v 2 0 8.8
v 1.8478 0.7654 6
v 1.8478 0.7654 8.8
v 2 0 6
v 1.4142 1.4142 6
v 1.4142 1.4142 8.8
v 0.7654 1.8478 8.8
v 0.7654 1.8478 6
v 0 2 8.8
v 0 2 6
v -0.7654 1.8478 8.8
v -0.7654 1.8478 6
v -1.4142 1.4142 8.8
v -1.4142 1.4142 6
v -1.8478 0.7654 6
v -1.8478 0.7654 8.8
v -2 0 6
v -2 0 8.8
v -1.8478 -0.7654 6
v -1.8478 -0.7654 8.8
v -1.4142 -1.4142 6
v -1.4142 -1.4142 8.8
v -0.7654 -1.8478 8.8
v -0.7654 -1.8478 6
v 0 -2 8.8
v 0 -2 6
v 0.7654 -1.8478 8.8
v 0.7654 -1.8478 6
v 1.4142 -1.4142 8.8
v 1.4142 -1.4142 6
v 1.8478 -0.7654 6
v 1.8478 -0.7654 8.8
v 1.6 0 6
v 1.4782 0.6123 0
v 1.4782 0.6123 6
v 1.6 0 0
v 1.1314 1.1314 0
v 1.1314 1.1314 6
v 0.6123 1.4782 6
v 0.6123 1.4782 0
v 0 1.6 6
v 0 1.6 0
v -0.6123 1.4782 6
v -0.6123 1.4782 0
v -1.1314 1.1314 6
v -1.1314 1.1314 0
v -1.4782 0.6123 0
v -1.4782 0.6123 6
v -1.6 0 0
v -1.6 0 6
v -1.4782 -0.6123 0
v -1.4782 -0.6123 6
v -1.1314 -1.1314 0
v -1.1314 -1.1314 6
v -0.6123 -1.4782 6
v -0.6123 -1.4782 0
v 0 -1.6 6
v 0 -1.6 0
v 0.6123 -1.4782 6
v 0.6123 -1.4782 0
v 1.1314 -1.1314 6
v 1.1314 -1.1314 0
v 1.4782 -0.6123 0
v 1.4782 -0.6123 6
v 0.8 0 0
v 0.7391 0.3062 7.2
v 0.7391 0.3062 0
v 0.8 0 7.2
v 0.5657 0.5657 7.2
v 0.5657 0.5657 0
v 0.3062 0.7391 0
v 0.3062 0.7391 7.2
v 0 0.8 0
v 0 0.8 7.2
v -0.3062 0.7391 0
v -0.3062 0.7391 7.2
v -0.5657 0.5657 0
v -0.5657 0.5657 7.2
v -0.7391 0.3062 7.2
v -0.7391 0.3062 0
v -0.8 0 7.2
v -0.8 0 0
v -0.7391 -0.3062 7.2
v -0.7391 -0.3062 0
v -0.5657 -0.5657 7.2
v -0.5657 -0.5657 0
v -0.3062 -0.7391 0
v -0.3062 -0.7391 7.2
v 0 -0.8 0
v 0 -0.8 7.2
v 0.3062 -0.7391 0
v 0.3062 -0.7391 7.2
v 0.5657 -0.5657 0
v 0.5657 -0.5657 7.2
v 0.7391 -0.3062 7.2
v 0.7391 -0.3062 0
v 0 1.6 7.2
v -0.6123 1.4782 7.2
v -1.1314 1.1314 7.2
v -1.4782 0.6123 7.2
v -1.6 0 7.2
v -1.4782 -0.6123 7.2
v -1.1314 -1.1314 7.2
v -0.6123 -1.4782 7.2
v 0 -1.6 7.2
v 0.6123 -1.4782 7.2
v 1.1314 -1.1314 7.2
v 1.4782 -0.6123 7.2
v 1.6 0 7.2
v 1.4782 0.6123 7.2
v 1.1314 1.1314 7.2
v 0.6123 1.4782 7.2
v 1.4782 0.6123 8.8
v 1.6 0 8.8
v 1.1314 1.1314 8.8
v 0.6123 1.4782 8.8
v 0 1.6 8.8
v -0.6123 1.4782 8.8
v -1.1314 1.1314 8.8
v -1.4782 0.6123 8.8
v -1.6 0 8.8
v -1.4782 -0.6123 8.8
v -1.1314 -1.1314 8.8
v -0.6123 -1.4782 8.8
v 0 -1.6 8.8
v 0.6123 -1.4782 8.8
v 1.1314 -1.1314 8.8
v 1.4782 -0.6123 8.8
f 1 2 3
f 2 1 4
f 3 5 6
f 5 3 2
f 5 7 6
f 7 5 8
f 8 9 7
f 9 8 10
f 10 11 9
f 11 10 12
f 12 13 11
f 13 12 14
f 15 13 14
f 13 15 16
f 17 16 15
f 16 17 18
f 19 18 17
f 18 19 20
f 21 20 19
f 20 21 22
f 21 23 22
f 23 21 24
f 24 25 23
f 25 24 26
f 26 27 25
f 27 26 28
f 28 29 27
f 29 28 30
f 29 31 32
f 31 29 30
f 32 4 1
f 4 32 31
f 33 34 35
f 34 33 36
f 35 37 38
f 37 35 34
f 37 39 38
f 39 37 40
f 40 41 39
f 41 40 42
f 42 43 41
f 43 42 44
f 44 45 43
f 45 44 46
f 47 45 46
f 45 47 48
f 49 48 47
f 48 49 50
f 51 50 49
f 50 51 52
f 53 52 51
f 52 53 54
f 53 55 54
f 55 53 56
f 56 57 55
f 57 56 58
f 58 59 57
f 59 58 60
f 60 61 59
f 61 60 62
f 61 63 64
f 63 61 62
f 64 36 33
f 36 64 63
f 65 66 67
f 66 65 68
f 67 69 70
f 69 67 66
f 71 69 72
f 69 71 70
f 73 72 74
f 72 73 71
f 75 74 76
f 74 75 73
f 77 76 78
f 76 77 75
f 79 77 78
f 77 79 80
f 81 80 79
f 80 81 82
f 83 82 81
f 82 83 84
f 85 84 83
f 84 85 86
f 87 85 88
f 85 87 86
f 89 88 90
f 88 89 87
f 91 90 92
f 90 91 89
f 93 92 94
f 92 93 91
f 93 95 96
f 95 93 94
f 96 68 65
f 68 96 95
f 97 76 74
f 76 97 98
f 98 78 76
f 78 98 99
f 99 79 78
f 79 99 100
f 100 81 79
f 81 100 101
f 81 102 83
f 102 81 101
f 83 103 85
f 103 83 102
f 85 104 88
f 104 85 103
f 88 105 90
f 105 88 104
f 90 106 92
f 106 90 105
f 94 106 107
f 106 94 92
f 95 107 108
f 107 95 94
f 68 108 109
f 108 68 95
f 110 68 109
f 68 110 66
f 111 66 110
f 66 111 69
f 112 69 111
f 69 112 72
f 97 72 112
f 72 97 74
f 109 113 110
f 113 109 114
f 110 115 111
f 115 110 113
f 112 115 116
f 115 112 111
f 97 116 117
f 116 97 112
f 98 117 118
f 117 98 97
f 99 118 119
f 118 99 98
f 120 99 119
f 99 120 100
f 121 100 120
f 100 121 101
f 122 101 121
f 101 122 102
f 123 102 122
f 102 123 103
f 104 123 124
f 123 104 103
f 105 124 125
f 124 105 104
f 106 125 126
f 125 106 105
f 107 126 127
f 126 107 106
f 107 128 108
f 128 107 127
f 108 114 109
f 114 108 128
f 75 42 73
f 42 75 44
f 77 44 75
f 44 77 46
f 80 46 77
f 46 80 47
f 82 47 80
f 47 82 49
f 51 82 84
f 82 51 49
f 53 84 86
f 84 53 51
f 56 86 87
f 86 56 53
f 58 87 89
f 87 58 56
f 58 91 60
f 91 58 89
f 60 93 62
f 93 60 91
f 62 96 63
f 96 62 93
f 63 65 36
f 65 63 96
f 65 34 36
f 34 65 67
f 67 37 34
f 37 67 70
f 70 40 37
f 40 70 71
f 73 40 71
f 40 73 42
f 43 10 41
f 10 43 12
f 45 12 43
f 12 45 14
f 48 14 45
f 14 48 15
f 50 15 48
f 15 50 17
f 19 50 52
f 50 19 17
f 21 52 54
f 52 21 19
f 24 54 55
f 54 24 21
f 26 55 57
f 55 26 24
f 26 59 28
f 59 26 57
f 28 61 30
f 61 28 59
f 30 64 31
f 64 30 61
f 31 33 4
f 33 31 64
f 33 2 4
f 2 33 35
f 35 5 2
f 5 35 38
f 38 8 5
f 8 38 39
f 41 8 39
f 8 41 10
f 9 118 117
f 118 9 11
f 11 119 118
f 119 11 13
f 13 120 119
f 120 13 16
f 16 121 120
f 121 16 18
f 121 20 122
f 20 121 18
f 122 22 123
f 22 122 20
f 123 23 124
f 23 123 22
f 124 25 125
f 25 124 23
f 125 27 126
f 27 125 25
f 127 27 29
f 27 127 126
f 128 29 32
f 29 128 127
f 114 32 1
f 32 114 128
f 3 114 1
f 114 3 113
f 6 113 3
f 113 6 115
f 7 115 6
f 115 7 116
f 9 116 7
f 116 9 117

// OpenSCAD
// file: ../p/4-4edge.scad
use <../lib.scad>
function ldraw_lib__4_4edge() = [
// 0 Circle 1.0
// 0 Name: 4-4edge.dat
// 0 Author: James Jessiman
// 0 !LDRAW_ORG Primitive UPDATE 2017-01
// 0 !LICENSE Licensed under CC BY 2.0 and CC BY 4.0 : see CAreadme.txt
// 
// 0 BFC CERTIFY CCW
  [0,"BFC","CERTIFY"],
  [0,"BFC","CCW"],
// 
// 0 !HISTORY 1998-12-15 [PTadmin] Official Update 1998-10
// 0 !HISTORY 2005-12-28 [PTadmin] Official Update 2005-01
// 0 !HISTORY 2007-06-24 [PTadmin] Header formatted for Contributor Agreement
// 0 !HISTORY 2008-07-01 [PTadmin] Official Update 2008-01
// 0 !HISTORY 2017-01-15 [Steffen] BFCed
// 0 !HISTORY 2017-12-30 [PTadmin] Official Update 2017-01
// 
// 
// 2 24 1 0 0 0.9239 0 0.3827
  [2,24,1,0,0,0.9239,0,0.3827],
// 2 24 0.9239 0 0.3827 0.7071 0 0.7071
  [2,24,0.9239,0,0.3827,0.7071,0,0.7071],
// 2 24 0.7071 0 0.7071 0.3827 0 0.9239
  [2,24,0.7071,0,0.7071,0.3827,0,0.9239],
// 2 24 0.3827 0 0.9239 0 0 1
  [2,24,0.3827,0,0.9239,0,0,1],
// 2 24 0 0 1 -0.3827 0 0.9239
  [2,24,0,0,1,-0.3827,0,0.9239],
// 2 24 -0.3827 0 0.9239 -0.7071 0 0.7071
  [2,24,-0.3827,0,0.9239,-0.7071,0,0.7071],
// 2 24 -0.7071 0 0.7071 -0.9239 0 0.3827
  [2,24,-0.7071,0,0.7071,-0.9239,0,0.3827],
// 2 24 -0.9239 0 0.3827 -1 0 -0
  [2,24,-0.9239,0,0.3827,-1,0,-0],
// 2 24 -1 0 -0 -0.9239 0 -0.3827
  [2,24,-1,0,-0,-0.9239,0,-0.3827],
// 2 24 -0.9239 0 -0.3827 -0.7071 0 -0.7071
  [2,24,-0.9239,0,-0.3827,-0.7071,0,-0.7071],
// 2 24 -0.7071 0 -0.7071 -0.3827 0 -0.9239
  [2,24,-0.7071,0,-0.7071,-0.3827,0,-0.9239],
// 2 24 -0.3827 0 -0.9239 0 0 -1
  [2,24,-0.3827,0,-0.9239,0,0,-1],
// 2 24 0 0 -1 0.3827 0 -0.9239
  [2,24,0,0,-1,0.3827,0,-0.9239],
// 2 24 0.3827 0 -0.9239 0.7071 0 -0.7071
  [2,24,0.3827,0,-0.9239,0.7071,0,-0.7071],
// 2 24 0.7071 0 -0.7071 0.9239 0 -0.3827
  [2,24,0.7071,0,-0.7071,0.9239,0,-0.3827],
// 2 24 0.9239 0 -0.3827 1 0 0
  [2,24,0.9239,0,-0.3827,1,0,0],
];
makepoly(ldraw_lib__4_4edge(), line=0.2);
// file: ../p/4-4cyli.scad
use <../lib.scad>
function ldraw_lib__4_4cyli() = [
// 0 Cylinder 1.0
// 0 Name: 4-4cyli.dat
// 0 Author: James Jessiman
// 0 !LDRAW_ORG Primitive UPDATE 2005-01
// 0 !LICENSE Licensed under CC BY 2.0 and CC BY 4.0 : see CAreadme.txt
// 
// 0 BFC CERTIFY CCW
  [0,"BFC","CERTIFY"],
  [0,"BFC","CCW"],
// 
// 0 !HISTORY 1998-12-15 [PTadmin] Official Update 1998-10
// 0 !HISTORY 2002-03-23 [sbliss] Added BFC statement; merged headers from files in distributions LDraw 0.27 and Complete.
// 0 !HISTORY 2002-04-25 [PTadmin] Official Update 2002-02
// 0 !HISTORY 2004-12-14 [guyvivan] BFC CCW
// 0 !HISTORY 2005-12-28 [PTadmin] Official Update 2005-01
// 0 !HISTORY 2007-06-24 [PTadmin] Header formatted for Contributor Agreement
// 0 !HISTORY 2008-07-01 [PTadmin] Official Update 2008-01
// 
// 
// 4 16 1 1 0 0.9239 1 0.3827 0.9239 0 0.3827 1 0 0
  [4,16,1,1,0,0.9239,1,0.3827,0.9239,0,0.3827,1,0,0],
// 5 24 1 0 0 1 1 0 0.9239 0 0.3827 0.9239 0 -0.3827
  [5,24,1,0,0,1,1,0,0.9239,0,0.3827,0.9239,0,-0.3827],
// 4 16 0.9239 1 0.3827 0.7071 1 0.7071 0.7071 0 0.7071 0.9239 0 0.3827
  [4,16,0.9239,1,0.3827,0.7071,1,0.7071,0.7071,0,0.7071,0.9239,0,0.3827],
// 5 24 0.9239 0 0.3827 0.9239 1 0.3827 0.7071 0 0.7071 1 0 0
  [5,24,0.9239,0,0.3827,0.9239,1,0.3827,0.7071,0,0.7071,1,0,0],
// 4 16 0.7071 1 0.7071 0.3827 1 0.9239 0.3827 0 0.9239 0.7071 0 0.7071
  [4,16,0.7071,1,0.7071,0.3827,1,0.9239,0.3827,0,0.9239,0.7071,0,0.7071],
// 5 24 0.7071 0 0.7071 0.7071 1 0.7071 0.3827 0 0.9239 0.9239 0 0.3827
  [5,24,0.7071,0,0.7071,0.7071,1,0.7071,0.3827,0,0.9239,0.9239,0,0.3827],
// 4 16 0.3827 1 0.9239 0 1 1 0 0 1 0.3827 0 0.9239
  [4,16,0.3827,1,0.9239,0,1,1,0,0,1,0.3827,0,0.9239],
// 5 24 0.3827 0 0.9239 0.3827 1 0.9239 0 0 1 0.7071 0 0.7071
  [5,24,0.3827,0,0.9239,0.3827,1,0.9239,0,0,1,0.7071,0,0.7071],
// 4 16 0 1 1 -0.3827 1 0.9239 -0.3827 0 0.9239 0 0 1
  [4,16,0,1,1,-0.3827,1,0.9239,-0.3827,0,0.9239,0,0,1],
// 5 24 0 0 1 0 1 1 -0.3827 0 0.9239 0.3827 0 0.9239
  [5,24,0,0,1,0,1,1,-0.3827,0,0.9239,0.3827,0,0.9239],
// 4 16 -0.3827 1 0.9239 -0.7071 1 0.7071 -0.7071 0 0.7071 -0.3827 0 0.9239
  [4,16,-0.3827,1,0.9239,-0.7071,1,0.7071,-0.7071,0,0.7071,-0.3827,0,0.9239],
// 5 24 -0.3827 0 0.9239 -0.3827 1 0.9239 -0.7071 0 0.7071 0 0 1
  [5,24,-0.3827,0,0.9239,-0.3827,1,0.9239,-0.7071,0,0.7071,0,0,1],
// 4 16 -0.7071 1 0.7071 -0.9239 1 0.3827 -0.9239 0 0.3827 -0.7071 0 0.7071
  [4,16,-0.7071,1,0.7071,-0.9239,1,0.3827,-0.9239,0,0.3827,-0.7071,0,0.7071],
// 5 24 -0.7071 0 0.7071 -0.7071 1 0.7071 -0.9239 0 0.3827 -0.3827 0 0.9239
  [5,24,-0.7071,0,0.7071,-0.7071,1,0.7071,-0.9239,0,0.3827,-0.3827,0,0.9239],
// 4 16 -0.9239 1 0.3827 -1 1 0 -1 0 0 -0.9239 0 0.3827
  [4,16,-0.9239,1,0.3827,-1,1,0,-1,0,0,-0.9239,0,0.3827],
// 5 24 -0.9239 0 0.3827 -0.9239 1 0.3827 -1 0 0 -0.7071 0 0.7071
  [5,24,-0.9239,0,0.3827,-0.9239,1,0.3827,-1,0,0,-0.7071,0,0.7071],
// 4 16 -1 1 0 -0.9239 1 -0.3827 -0.9239 0 -0.3827 -1 0 0
  [4,16,-1,1,0,-0.9239,1,-0.3827,-0.9239,0,-0.3827,-1,0,0],
// 5 24 -1 0 0 -1 1 0 -0.9239 0 -0.3827 -0.9239 0 0.3827
  [5,24,-1,0,0,-1,1,0,-0.9239,0,-0.3827,-0.9239,0,0.3827],
// 4 16 -0.9239 1 -0.3827 -0.7071 1 -0.7071 -0.7071 0 -0.7071 -0.9239 0 -0.3827
  [4,16,-0.9239,1,-0.3827,-0.7071,1,-0.7071,-0.7071,0,-0.7071,-0.9239,0,-0.3827],
// 5 24 -0.9239 0 -0.3827 -0.9239 1 -0.3827 -0.7071 0 -0.7071 -1 0 0
  [5,24,-0.9239,0,-0.3827,-0.9239,1,-0.3827,-0.7071,0,-0.7071,-1,0,0],
// 4 16 -0.7071 1 -0.7071 -0.3827 1 -0.9239 -0.3827 0 -0.9239 -0.7071 0 -0.7071
  [4,16,-0.7071,1,-0.7071,-0.3827,1,-0.9239,-0.3827,0,-0.9239,-0.7071,0,-0.7071],
// 5 24 -0.7071 0 -0.7071 -0.7071 1 -0.7071 -0.3827 0 -0.9239 -0.9239 0 -0.3827
  [5,24,-0.7071,0,-0.7071,-0.7071,1,-0.7071,-0.3827,0,-0.9239,-0.9239,0,-0.3827],
// 4 16 -0.3827 1 -0.9239 0 1 -1 0 0 -1 -0.3827 0 -0.9239
  [4,16,-0.3827,1,-0.9239,0,1,-1,0,0,-1,-0.3827,0,-0.9239],
// 5 24 -0.3827 0 -0.9239 -0.3827 1 -0.9239 0 0 -1 -0.7071 0 -0.7071
  [5,24,-0.3827,0,-0.9239,-0.3827,1,-0.9239,0,0,-1,-0.7071,0,-0.7071],
// 4 16 0 1 -1 0.3827 1 -0.9239 0.3827 0 -0.9239 0 0 -1
  [4,16,0,1,-1,0.3827,1,-0.9239,0.3827,0,-0.9239,0,0,-1],
// 5 24 0 0 -1 0 1 -1 0.3827 0 -0.9239 -0.3827 0 -0.9239
  [5,24,0,0,-1,0,1,-1,0.3827,0,-0.9239,-0.3827,0,-0.9239],
// 4 16 0.3827 1 -0.9239 0.7071 1 -0.7071 0.7071 0 -0.7071 0.3827 0 -0.9239
  [4,16,0.3827,1,-0.9239,0.7071,1,-0.7071,0.7071,0,-0.7071,0.3827,0,-0.9239],
// 5 24 0.3827 0 -0.9239 0.3827 1 -0.9239 0.7071 0 -0.7071 0 0 -1
  [5,24,0.3827,0,-0.9239,0.3827,1,-0.9239,0.7071,0,-0.7071,0,0,-1],
// 4 16 0.7071 1 -0.7071 0.9239 1 -0.3827 0.9239 0 -0.3827 0.7071 0 -0.7071
  [4,16,0.7071,1,-0.7071,0.9239,1,-0.3827,0.9239,0,-0.3827,0.7071,0,-0.7071],
// 5 24 0.7071 0 -0.7071 0.7071 1 -0.7071 0.9239 0 -0.3827 0.3827 0 -0.9239
  [5,24,0.7071,0,-0.7071,0.7071,1,-0.7071,0.9239,0,-0.3827,0.3827,0,-0.9239],
// 4 16 0.9239 1 -0.3827 1 1 0 1 0 0 0.9239 0 -0.3827
  [4,16,0.9239,1,-0.3827,1,1,0,1,0,0,0.9239,0,-0.3827],
// 5 24 0.9239 0 -0.3827 0.9239 1 -0.3827 1 0 0 0.7071 0 -0.7071
  [5,24,0.9239,0,-0.3827,0.9239,1,-0.3827,1,0,0,0.7071,0,-0.7071],
// 0
];
makepoly(ldraw_lib__4_4cyli(), line=0.2);
// file: ../p/4-4ring4.scad
use <../lib.scad>
function ldraw_lib__4_4ring4() = [
// 0 Ring  4 x 1.0
// 0 Name: 4-4ring4.dat
// 0 Author: James Jessiman
// 0 !LDRAW_ORG Primitive UPDATE 2009-01
// 0 !LICENSE Licensed under CC BY 2.0 and CC BY 4.0 : see CAreadme.txt
// 
// 0 BFC CERTIFY CCW
  [0,"BFC","CERTIFY"],
  [0,"BFC","CCW"],
// 
// 0 !HISTORY 1998-12-15 [PTadmin] Official Update 1998-10
// 0 !HISTORY 2002-04-08 [BrickCaster] Modified for BFC compliance
// 0 !HISTORY 2002-04-25 [PTadmin] Official Update 2002-02
// 0 !HISTORY 2007-06-24 [PTadmin] Header formatted for Contributor Agreement
// 0 !HISTORY 2008-07-01 [PTadmin] Official Update 2008-01
// 0 !HISTORY 2008-08-26 [cwdee] Switch polygon winding and rename
// 0 !HISTORY 2009-05-02 [PTadmin] Official Update 2009-01
// 
// 
// 4 16 -1.9135 0 4.6195 -1.5308 0 3.6956 0 0 4 0 0 5
  [4,16,-1.9135,0,4.6195,-1.5308,0,3.6956,0,0,4,0,0,5],
// 4 16 -3.5355 0 3.5355 -2.8284 0 2.8284 -1.5308 0 3.6956 -1.9135 0 4.6195
  [4,16,-3.5355,0,3.5355,-2.8284,0,2.8284,-1.5308,0,3.6956,-1.9135,0,4.6195],
// 4 16 -4.6195 0 1.9135 -3.6956 0 1.5308 -2.8284 0 2.8284 -3.5355 0 3.5355
  [4,16,-4.6195,0,1.9135,-3.6956,0,1.5308,-2.8284,0,2.8284,-3.5355,0,3.5355],
// 4 16 -5 0 0 -4 0 0 -3.6956 0 1.5308 -4.6195 0 1.9135
  [4,16,-5,0,0,-4,0,0,-3.6956,0,1.5308,-4.6195,0,1.9135],
// 4 16 -4.6195 0 -1.9135 -3.6956 0 -1.5308 -4 0 0 -5 0 0
  [4,16,-4.6195,0,-1.9135,-3.6956,0,-1.5308,-4,0,0,-5,0,0],
// 4 16 -3.5355 0 -3.5355 -2.8284 0 -2.8284 -3.6956 0 -1.5308 -4.6195 0 -1.9135
  [4,16,-3.5355,0,-3.5355,-2.8284,0,-2.8284,-3.6956,0,-1.5308,-4.6195,0,-1.9135],
// 4 16 -1.9135 0 -4.6195 -1.5308 0 -3.6956 -2.8284 0 -2.8284 -3.5355 0 -3.5355
  [4,16,-1.9135,0,-4.6195,-1.5308,0,-3.6956,-2.8284,0,-2.8284,-3.5355,0,-3.5355],
// 4 16 0 0 -5 0 0 -4 -1.5308 0 -3.6956 -1.9135 0 -4.6195
  [4,16,0,0,-5,0,0,-4,-1.5308,0,-3.6956,-1.9135,0,-4.6195],
// 4 16 1.9135 0 -4.6195 1.5308 0 -3.6956 0 0 -4 0 0 -5
  [4,16,1.9135,0,-4.6195,1.5308,0,-3.6956,0,0,-4,0,0,-5],
// 4 16 3.5355 0 -3.5355 2.8284 0 -2.8284 1.5308 0 -3.6956 1.9135 0 -4.6195
  [4,16,3.5355,0,-3.5355,2.8284,0,-2.8284,1.5308,0,-3.6956,1.9135,0,-4.6195],
// 4 16 4.6195 0 -1.9135 3.6956 0 -1.5308 2.8284 0 -2.8284 3.5355 0 -3.5355
  [4,16,4.6195,0,-1.9135,3.6956,0,-1.5308,2.8284,0,-2.8284,3.5355,0,-3.5355],
// 4 16 5 0 0 4 0 0 3.6956 0 -1.5308 4.6195 0 -1.9135
  [4,16,5,0,0,4,0,0,3.6956,0,-1.5308,4.6195,0,-1.9135],
// 4 16 4.6195 0 1.9135 3.6956 0 1.5308 4 0 0 5 0 0
  [4,16,4.6195,0,1.9135,3.6956,0,1.5308,4,0,0,5,0,0],
// 4 16 3.5355 0 3.5355 2.8284 0 2.8284 3.6956 0 1.5308 4.6195 0 1.9135
  [4,16,3.5355,0,3.5355,2.8284,0,2.8284,3.6956,0,1.5308,4.6195,0,1.9135],
// 4 16 1.9135 0 4.6195 1.5308 0 3.6956 2.8284 0 2.8284 3.5355 0 3.5355
  [4,16,1.9135,0,4.6195,1.5308,0,3.6956,2.8284,0,2.8284,3.5355,0,3.5355],
// 4 16 0 0 5 0 0 4 1.5308 0 3.6956 1.9135 0 4.6195
  [4,16,0,0,5,0,0,4,1.5308,0,3.6956,1.9135,0,4.6195],
// 0
];
makepoly(ldraw_lib__4_4ring4(), line=0.2);
// file: ../p/4-4ring1.scad
use <../lib.scad>
function ldraw_lib__4_4ring1() = [
// 0 Ring  1 x 1.0
// 0 Name: 4-4ring1.dat
// 0 Author: James Jessiman
// 0 !LDRAW_ORG Primitive UPDATE 2009-01
// 0 !LICENSE Licensed under CC BY 2.0 and CC BY 4.0 : see CAreadme.txt
// 
// 0 BFC CERTIFY CCW
  [0,"BFC","CERTIFY"],
  [0,"BFC","CCW"],
// 
// 0 !HISTORY 1998-12-15 [PTadmin] Official Update 1998-10
// 0 !HISTORY 2002-04-08 [BrickCaster] Modified for BFC compliance
// 0 !HISTORY 2002-04-25 [PTadmin] Official Update 2002-02
// 0 !HISTORY 2007-06-24 [PTadmin] Header formatted for Contributor Agreement
// 0 !HISTORY 2008-07-01 [PTadmin] Official Update 2008-01
// 0 !HISTORY 2008-08-26 [cwdee] Switch polygon winding and rename
// 0 !HISTORY 2009-05-02 [PTadmin] Official Update 2009-01
// 
// 
// 4 16 -0.7654 0 1.8478 -0.3827 0 0.9239 0 0 1 0 0 2
  [4,16,-0.7654,0,1.8478,-0.3827,0,0.9239,0,0,1,0,0,2],
// 4 16 -1.4142 0 1.4142 -0.7071 0 0.7071 -0.3827 0 0.9239 -0.7654 0 1.8478
  [4,16,-1.4142,0,1.4142,-0.7071,0,0.7071,-0.3827,0,0.9239,-0.7654,0,1.8478],
// 4 16 -1.8478 0 0.7654 -0.9239 0 0.3827 -0.7071 0 0.7071 -1.4142 0 1.41420
  [4,16,-1.8478,0,0.7654,-0.9239,0,0.3827,-0.7071,0,0.7071,-1.4142,0,1.41420],
// 4 16 -2 0 0 -1 0 0 -0.9239 0 0.3827 -1.8478 0 0.7654
  [4,16,-2,0,0,-1,0,0,-0.9239,0,0.3827,-1.8478,0,0.7654],
// 4 16 -1.8478 0 -0.7654 -0.9239 0 -0.3827 -1 0 0 -2 0 0
  [4,16,-1.8478,0,-0.7654,-0.9239,0,-0.3827,-1,0,0,-2,0,0],
// 4 16 -1.4142 0 -1.4142 -0.7071 0 -0.7071 -0.9239 0 -0.3827 -1.8478 0 -0.7654
  [4,16,-1.4142,0,-1.4142,-0.7071,0,-0.7071,-0.9239,0,-0.3827,-1.8478,0,-0.7654],
// 4 16 -0.7654 0 -1.8478 -0.3827 0 -0.9239 -0.7071 0 -0.7071 -1.4142 0 -1.4142
  [4,16,-0.7654,0,-1.8478,-0.3827,0,-0.9239,-0.7071,0,-0.7071,-1.4142,0,-1.4142],
// 4 16 0 0 -2 0 0 -1 -0.3827 0 -0.9239 -0.7654 0 -1.8478
  [4,16,0,0,-2,0,0,-1,-0.3827,0,-0.9239,-0.7654,0,-1.8478],
// 4 16 0.7654 0 -1.8478 0.3827 0 -0.9239 0 0 -1 0 0 -2
  [4,16,0.7654,0,-1.8478,0.3827,0,-0.9239,0,0,-1,0,0,-2],
// 4 16 1.4142 0 -1.4142 0.7071 0 -0.7071 0.3827 0 -0.9239 0.7654 0 -1.8478
  [4,16,1.4142,0,-1.4142,0.7071,0,-0.7071,0.3827,0,-0.9239,0.7654,0,-1.8478],
// 4 16 1.8478 0 -0.7654 0.9239 0 -0.3827 0.7071 0 -0.7071 1.4142 0 -1.4142
  [4,16,1.8478,0,-0.7654,0.9239,0,-0.3827,0.7071,0,-0.7071,1.4142,0,-1.4142],
// 4 16 2 0 0 1 0 0 0.9239 0 -0.3827 1.8478 0 -0.7654
  [4,16,2,0,0,1,0,0,0.9239,0,-0.3827,1.8478,0,-0.7654],
// 4 16 1.8478 0 0.7654 0.9239 0 0.3827 1 0 0 2 0 0
  [4,16,1.8478,0,0.7654,0.9239,0,0.3827,1,0,0,2,0,0],
// 4 16 1.4142 0 1.4142 0.7071 0 0.7071 0.9239 0 0.3827 1.8478 0 0.7654
  [4,16,1.4142,0,1.4142,0.7071,0,0.7071,0.9239,0,0.3827,1.8478,0,0.7654],
// 4 16 0.7654 0 1.8478 0.3827 0 0.9239 0.7071 0 0.7071 1.4142 0 1.4142
  [4,16,0.7654,0,1.8478,0.3827,0,0.9239,0.7071,0,0.7071,1.4142,0,1.4142],
// 4 16 0 0 2 0 0 1 0.3827 0 0.9239 0.7654 0 1.8478
  [4,16,0,0,2,0,0,1,0.3827,0,0.9239,0.7654,0,1.8478],
// 0
];
makepoly(ldraw_lib__4_4ring1(), line=0.2);
// file: ../p/4-4cylo.scad
use <../lib.scad>
use <4-4cyli.scad>
use <4-4edge.scad>
function ldraw_lib__4_4cylo() = [
// 0 Cylinder Open 1.0
// 0 Name: 4-4cylo.dat
// 0 Author: Mark Kennedy [mkennedy]
// 0 !LDRAW_ORG Primitive UPDATE 2010-01
// 0 !LICENSE Licensed under CC BY 2.0 and CC BY 4.0 : see CAreadme.txt
// 
// 0 BFC CERTIFY CCW
  [0,"BFC","CERTIFY"],
  [0,"BFC","CCW"],
// 
// 0 !HISTORY 2010-04-05 [PTadmin] Official Update 2010-01
// 
// 
// 1 16 0 0 0 1 0 0 0 1 0 0 0 1 4-4edge.dat
  [1,16,0,0,0,1,0,0,0,1,0,0,0,1, ldraw_lib__4_4edge()],
// 1 16 0 1 0 1 0 0 0 1 0 0 0 1 4-4edge.dat
  [1,16,0,1,0,1,0,0,0,1,0,0,0,1, ldraw_lib__4_4edge()],
// 1 16 0 0 0 1 0 0 0 1 0 0 0 1 4-4cyli.dat
  [1,16,0,0,0,1,0,0,0,1,0,0,0,1, ldraw_lib__4_4cyli()],
// 0
];
makepoly(ldraw_lib__4_4cylo(), line=0.2);
// main file
use <../lib.scad>
use <../p/4-4cylo.scad>
use <../p/4-4ring1.scad>
use <../p/4-4ring4.scad>
function ldraw_lib__95108() = [
// 0 ~Friends Lipstick Handle
// 0 Name: 95108.dat
// 0 Author: Philippe Hurbain [Philo]
// 0 !LDRAW_ORG Part UPDATE 2015-01
// 0 !LICENSE Licensed under CC BY 2.0 and CC BY 4.0 : see CAreadme.txt
// 
// 0 BFC CERTIFY CCW
  [0,"BFC","CERTIFY"],
  [0,"BFC","CCW"],
// 
// 0 !CATEGORY Figure Accessory
// 
// 0 !HISTORY 2013-08-14 {LEGO Digital Designer} Original part shape
// 0 !HISTORY 2014-10-06 [Philo] Complete rebuild for LDraw Parts Tracker
// 0 !HISTORY 2015-10-11 [PTadmin] Official Update 2015-01
// 
// 
// 1 16 0 -15 0 5 0 0 0 -7 0 0 0 5 4-4cylo.dat
  [1,16,0,-15,0,5,0,0,0,-7,0,0,0,5, ldraw_lib__4_4cylo()],
// 1 16 0 0 0 4 0 0 0 -15 0 0 0 4 4-4cylo.dat
  [1,16,0,0,0,4,0,0,0,-15,0,0,0,4, ldraw_lib__4_4cylo()],
// 0 BFC INVERTNEXT
  [0,"BFC","INVERTNEXT"],
// 1 16 0 0 0 2 0 0 0 -18 0 0 0 2 4-4cylo.dat
  [1,16,0,0,0,2,0,0,0,-18,0,0,0,2, ldraw_lib__4_4cylo()],
// 1 16 0 -18 0 2 0 0 0 1 0 0 0 2 4-4ring1.dat
  [1,16,0,-18,0,2,0,0,0,1,0,0,0,2, ldraw_lib__4_4ring1()],
// 0 BFC INVERTNEXT
  [0,"BFC","INVERTNEXT"],
// 1 16 0 -18 0 4 0 0 0 -4 0 0 0 4 4-4cylo.dat
  [1,16,0,-18,0,4,0,0,0,-4,0,0,0,4, ldraw_lib__4_4cylo()],
// 1 16 0 0 0 2 0 0 0 -1 0 0 0 2 4-4ring1.dat
  [1,16,0,0,0,2,0,0,0,-1,0,0,0,2, ldraw_lib__4_4ring1()],
// 1 16 0 -15 0 1 0 0 0 -1 0 0 0 1 4-4ring4.dat
  [1,16,0,-15,0,1,0,0,0,-1,0,0,0,1, ldraw_lib__4_4ring4()],
// 1 16 0 -22 0 1 0 0 0 1 0 0 0 1 4-4ring4.dat
  [1,16,0,-22,0,1,0,0,0,1,0,0,0,1, ldraw_lib__4_4ring4()],
];
makepoly(ldraw_lib__95108(), line=0.2);
